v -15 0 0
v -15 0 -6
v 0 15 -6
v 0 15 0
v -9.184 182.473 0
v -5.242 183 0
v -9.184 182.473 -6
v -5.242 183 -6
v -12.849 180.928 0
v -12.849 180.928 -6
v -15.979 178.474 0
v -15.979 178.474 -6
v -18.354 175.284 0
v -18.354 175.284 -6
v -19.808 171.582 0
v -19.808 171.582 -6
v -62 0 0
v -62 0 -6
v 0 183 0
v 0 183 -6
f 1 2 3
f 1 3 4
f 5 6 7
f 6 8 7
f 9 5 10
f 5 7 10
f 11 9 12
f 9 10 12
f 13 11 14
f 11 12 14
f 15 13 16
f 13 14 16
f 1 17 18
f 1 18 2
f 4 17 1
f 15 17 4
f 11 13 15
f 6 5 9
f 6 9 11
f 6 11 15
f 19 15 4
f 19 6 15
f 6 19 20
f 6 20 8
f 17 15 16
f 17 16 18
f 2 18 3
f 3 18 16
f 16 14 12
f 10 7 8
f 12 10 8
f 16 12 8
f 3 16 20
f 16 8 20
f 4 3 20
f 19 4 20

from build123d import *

# Parameters (mm, degrees)
SM_BASE_FLANGE_1_DEPTH   = 6
FILLET_1_R               = 15
CUT_EXTRUDE_1_DEPTH      = 200.020099487
CUT_EXTRUDE_1_DEPTH_BACK = 200.020099487
SKETCH_4_W               = 94.166763327
SKETCH_4_H               = 540.193326504
CHAMFER_1_SIZE           = 15


# Sheet-metal steps are written as plain solids
with BuildPart() as part:
    # Sketch 2 → Базовая кромка1 (new body)
    with BuildSketch(Plane.XY):
        Polygon((-62, 0), (78, 0), (33, 183), (-17, 183), align=None)
    extrude(amount=-SM_BASE_FLANGE_1_DEPTH)

    # Скругление1
    fillet_1_edges = [part.edges().sort_by_distance(p)[0] for p in [
        (-17, 183, -3),
        (33, 183, -3),
    ]]
    fillet(fillet_1_edges, radius=FILLET_1_R)

    # Эскиз4 → Вырез-Вытянуть1 (cut, two sides: drawn at the far end of the back side and taken through both)
    with BuildSketch(Plane.XY.offset(-CUT_EXTRUDE_1_DEPTH_BACK)):
        with Locations((47.083381664, 270.096663252)):
            Rectangle(SKETCH_4_W, SKETCH_4_H)
    extrude(amount=CUT_EXTRUDE_1_DEPTH + CUT_EXTRUDE_1_DEPTH_BACK, mode=Mode.SUBTRACT)

    # Фаска1
    chamfer_1_edges = [part.edges().sort_by_distance(p)[0] for p in [
        (0, 0, -3),
    ]]
    chamfer(chamfer_1_edges, length=CHAMFER_1_SIZE)


solid = part.part
